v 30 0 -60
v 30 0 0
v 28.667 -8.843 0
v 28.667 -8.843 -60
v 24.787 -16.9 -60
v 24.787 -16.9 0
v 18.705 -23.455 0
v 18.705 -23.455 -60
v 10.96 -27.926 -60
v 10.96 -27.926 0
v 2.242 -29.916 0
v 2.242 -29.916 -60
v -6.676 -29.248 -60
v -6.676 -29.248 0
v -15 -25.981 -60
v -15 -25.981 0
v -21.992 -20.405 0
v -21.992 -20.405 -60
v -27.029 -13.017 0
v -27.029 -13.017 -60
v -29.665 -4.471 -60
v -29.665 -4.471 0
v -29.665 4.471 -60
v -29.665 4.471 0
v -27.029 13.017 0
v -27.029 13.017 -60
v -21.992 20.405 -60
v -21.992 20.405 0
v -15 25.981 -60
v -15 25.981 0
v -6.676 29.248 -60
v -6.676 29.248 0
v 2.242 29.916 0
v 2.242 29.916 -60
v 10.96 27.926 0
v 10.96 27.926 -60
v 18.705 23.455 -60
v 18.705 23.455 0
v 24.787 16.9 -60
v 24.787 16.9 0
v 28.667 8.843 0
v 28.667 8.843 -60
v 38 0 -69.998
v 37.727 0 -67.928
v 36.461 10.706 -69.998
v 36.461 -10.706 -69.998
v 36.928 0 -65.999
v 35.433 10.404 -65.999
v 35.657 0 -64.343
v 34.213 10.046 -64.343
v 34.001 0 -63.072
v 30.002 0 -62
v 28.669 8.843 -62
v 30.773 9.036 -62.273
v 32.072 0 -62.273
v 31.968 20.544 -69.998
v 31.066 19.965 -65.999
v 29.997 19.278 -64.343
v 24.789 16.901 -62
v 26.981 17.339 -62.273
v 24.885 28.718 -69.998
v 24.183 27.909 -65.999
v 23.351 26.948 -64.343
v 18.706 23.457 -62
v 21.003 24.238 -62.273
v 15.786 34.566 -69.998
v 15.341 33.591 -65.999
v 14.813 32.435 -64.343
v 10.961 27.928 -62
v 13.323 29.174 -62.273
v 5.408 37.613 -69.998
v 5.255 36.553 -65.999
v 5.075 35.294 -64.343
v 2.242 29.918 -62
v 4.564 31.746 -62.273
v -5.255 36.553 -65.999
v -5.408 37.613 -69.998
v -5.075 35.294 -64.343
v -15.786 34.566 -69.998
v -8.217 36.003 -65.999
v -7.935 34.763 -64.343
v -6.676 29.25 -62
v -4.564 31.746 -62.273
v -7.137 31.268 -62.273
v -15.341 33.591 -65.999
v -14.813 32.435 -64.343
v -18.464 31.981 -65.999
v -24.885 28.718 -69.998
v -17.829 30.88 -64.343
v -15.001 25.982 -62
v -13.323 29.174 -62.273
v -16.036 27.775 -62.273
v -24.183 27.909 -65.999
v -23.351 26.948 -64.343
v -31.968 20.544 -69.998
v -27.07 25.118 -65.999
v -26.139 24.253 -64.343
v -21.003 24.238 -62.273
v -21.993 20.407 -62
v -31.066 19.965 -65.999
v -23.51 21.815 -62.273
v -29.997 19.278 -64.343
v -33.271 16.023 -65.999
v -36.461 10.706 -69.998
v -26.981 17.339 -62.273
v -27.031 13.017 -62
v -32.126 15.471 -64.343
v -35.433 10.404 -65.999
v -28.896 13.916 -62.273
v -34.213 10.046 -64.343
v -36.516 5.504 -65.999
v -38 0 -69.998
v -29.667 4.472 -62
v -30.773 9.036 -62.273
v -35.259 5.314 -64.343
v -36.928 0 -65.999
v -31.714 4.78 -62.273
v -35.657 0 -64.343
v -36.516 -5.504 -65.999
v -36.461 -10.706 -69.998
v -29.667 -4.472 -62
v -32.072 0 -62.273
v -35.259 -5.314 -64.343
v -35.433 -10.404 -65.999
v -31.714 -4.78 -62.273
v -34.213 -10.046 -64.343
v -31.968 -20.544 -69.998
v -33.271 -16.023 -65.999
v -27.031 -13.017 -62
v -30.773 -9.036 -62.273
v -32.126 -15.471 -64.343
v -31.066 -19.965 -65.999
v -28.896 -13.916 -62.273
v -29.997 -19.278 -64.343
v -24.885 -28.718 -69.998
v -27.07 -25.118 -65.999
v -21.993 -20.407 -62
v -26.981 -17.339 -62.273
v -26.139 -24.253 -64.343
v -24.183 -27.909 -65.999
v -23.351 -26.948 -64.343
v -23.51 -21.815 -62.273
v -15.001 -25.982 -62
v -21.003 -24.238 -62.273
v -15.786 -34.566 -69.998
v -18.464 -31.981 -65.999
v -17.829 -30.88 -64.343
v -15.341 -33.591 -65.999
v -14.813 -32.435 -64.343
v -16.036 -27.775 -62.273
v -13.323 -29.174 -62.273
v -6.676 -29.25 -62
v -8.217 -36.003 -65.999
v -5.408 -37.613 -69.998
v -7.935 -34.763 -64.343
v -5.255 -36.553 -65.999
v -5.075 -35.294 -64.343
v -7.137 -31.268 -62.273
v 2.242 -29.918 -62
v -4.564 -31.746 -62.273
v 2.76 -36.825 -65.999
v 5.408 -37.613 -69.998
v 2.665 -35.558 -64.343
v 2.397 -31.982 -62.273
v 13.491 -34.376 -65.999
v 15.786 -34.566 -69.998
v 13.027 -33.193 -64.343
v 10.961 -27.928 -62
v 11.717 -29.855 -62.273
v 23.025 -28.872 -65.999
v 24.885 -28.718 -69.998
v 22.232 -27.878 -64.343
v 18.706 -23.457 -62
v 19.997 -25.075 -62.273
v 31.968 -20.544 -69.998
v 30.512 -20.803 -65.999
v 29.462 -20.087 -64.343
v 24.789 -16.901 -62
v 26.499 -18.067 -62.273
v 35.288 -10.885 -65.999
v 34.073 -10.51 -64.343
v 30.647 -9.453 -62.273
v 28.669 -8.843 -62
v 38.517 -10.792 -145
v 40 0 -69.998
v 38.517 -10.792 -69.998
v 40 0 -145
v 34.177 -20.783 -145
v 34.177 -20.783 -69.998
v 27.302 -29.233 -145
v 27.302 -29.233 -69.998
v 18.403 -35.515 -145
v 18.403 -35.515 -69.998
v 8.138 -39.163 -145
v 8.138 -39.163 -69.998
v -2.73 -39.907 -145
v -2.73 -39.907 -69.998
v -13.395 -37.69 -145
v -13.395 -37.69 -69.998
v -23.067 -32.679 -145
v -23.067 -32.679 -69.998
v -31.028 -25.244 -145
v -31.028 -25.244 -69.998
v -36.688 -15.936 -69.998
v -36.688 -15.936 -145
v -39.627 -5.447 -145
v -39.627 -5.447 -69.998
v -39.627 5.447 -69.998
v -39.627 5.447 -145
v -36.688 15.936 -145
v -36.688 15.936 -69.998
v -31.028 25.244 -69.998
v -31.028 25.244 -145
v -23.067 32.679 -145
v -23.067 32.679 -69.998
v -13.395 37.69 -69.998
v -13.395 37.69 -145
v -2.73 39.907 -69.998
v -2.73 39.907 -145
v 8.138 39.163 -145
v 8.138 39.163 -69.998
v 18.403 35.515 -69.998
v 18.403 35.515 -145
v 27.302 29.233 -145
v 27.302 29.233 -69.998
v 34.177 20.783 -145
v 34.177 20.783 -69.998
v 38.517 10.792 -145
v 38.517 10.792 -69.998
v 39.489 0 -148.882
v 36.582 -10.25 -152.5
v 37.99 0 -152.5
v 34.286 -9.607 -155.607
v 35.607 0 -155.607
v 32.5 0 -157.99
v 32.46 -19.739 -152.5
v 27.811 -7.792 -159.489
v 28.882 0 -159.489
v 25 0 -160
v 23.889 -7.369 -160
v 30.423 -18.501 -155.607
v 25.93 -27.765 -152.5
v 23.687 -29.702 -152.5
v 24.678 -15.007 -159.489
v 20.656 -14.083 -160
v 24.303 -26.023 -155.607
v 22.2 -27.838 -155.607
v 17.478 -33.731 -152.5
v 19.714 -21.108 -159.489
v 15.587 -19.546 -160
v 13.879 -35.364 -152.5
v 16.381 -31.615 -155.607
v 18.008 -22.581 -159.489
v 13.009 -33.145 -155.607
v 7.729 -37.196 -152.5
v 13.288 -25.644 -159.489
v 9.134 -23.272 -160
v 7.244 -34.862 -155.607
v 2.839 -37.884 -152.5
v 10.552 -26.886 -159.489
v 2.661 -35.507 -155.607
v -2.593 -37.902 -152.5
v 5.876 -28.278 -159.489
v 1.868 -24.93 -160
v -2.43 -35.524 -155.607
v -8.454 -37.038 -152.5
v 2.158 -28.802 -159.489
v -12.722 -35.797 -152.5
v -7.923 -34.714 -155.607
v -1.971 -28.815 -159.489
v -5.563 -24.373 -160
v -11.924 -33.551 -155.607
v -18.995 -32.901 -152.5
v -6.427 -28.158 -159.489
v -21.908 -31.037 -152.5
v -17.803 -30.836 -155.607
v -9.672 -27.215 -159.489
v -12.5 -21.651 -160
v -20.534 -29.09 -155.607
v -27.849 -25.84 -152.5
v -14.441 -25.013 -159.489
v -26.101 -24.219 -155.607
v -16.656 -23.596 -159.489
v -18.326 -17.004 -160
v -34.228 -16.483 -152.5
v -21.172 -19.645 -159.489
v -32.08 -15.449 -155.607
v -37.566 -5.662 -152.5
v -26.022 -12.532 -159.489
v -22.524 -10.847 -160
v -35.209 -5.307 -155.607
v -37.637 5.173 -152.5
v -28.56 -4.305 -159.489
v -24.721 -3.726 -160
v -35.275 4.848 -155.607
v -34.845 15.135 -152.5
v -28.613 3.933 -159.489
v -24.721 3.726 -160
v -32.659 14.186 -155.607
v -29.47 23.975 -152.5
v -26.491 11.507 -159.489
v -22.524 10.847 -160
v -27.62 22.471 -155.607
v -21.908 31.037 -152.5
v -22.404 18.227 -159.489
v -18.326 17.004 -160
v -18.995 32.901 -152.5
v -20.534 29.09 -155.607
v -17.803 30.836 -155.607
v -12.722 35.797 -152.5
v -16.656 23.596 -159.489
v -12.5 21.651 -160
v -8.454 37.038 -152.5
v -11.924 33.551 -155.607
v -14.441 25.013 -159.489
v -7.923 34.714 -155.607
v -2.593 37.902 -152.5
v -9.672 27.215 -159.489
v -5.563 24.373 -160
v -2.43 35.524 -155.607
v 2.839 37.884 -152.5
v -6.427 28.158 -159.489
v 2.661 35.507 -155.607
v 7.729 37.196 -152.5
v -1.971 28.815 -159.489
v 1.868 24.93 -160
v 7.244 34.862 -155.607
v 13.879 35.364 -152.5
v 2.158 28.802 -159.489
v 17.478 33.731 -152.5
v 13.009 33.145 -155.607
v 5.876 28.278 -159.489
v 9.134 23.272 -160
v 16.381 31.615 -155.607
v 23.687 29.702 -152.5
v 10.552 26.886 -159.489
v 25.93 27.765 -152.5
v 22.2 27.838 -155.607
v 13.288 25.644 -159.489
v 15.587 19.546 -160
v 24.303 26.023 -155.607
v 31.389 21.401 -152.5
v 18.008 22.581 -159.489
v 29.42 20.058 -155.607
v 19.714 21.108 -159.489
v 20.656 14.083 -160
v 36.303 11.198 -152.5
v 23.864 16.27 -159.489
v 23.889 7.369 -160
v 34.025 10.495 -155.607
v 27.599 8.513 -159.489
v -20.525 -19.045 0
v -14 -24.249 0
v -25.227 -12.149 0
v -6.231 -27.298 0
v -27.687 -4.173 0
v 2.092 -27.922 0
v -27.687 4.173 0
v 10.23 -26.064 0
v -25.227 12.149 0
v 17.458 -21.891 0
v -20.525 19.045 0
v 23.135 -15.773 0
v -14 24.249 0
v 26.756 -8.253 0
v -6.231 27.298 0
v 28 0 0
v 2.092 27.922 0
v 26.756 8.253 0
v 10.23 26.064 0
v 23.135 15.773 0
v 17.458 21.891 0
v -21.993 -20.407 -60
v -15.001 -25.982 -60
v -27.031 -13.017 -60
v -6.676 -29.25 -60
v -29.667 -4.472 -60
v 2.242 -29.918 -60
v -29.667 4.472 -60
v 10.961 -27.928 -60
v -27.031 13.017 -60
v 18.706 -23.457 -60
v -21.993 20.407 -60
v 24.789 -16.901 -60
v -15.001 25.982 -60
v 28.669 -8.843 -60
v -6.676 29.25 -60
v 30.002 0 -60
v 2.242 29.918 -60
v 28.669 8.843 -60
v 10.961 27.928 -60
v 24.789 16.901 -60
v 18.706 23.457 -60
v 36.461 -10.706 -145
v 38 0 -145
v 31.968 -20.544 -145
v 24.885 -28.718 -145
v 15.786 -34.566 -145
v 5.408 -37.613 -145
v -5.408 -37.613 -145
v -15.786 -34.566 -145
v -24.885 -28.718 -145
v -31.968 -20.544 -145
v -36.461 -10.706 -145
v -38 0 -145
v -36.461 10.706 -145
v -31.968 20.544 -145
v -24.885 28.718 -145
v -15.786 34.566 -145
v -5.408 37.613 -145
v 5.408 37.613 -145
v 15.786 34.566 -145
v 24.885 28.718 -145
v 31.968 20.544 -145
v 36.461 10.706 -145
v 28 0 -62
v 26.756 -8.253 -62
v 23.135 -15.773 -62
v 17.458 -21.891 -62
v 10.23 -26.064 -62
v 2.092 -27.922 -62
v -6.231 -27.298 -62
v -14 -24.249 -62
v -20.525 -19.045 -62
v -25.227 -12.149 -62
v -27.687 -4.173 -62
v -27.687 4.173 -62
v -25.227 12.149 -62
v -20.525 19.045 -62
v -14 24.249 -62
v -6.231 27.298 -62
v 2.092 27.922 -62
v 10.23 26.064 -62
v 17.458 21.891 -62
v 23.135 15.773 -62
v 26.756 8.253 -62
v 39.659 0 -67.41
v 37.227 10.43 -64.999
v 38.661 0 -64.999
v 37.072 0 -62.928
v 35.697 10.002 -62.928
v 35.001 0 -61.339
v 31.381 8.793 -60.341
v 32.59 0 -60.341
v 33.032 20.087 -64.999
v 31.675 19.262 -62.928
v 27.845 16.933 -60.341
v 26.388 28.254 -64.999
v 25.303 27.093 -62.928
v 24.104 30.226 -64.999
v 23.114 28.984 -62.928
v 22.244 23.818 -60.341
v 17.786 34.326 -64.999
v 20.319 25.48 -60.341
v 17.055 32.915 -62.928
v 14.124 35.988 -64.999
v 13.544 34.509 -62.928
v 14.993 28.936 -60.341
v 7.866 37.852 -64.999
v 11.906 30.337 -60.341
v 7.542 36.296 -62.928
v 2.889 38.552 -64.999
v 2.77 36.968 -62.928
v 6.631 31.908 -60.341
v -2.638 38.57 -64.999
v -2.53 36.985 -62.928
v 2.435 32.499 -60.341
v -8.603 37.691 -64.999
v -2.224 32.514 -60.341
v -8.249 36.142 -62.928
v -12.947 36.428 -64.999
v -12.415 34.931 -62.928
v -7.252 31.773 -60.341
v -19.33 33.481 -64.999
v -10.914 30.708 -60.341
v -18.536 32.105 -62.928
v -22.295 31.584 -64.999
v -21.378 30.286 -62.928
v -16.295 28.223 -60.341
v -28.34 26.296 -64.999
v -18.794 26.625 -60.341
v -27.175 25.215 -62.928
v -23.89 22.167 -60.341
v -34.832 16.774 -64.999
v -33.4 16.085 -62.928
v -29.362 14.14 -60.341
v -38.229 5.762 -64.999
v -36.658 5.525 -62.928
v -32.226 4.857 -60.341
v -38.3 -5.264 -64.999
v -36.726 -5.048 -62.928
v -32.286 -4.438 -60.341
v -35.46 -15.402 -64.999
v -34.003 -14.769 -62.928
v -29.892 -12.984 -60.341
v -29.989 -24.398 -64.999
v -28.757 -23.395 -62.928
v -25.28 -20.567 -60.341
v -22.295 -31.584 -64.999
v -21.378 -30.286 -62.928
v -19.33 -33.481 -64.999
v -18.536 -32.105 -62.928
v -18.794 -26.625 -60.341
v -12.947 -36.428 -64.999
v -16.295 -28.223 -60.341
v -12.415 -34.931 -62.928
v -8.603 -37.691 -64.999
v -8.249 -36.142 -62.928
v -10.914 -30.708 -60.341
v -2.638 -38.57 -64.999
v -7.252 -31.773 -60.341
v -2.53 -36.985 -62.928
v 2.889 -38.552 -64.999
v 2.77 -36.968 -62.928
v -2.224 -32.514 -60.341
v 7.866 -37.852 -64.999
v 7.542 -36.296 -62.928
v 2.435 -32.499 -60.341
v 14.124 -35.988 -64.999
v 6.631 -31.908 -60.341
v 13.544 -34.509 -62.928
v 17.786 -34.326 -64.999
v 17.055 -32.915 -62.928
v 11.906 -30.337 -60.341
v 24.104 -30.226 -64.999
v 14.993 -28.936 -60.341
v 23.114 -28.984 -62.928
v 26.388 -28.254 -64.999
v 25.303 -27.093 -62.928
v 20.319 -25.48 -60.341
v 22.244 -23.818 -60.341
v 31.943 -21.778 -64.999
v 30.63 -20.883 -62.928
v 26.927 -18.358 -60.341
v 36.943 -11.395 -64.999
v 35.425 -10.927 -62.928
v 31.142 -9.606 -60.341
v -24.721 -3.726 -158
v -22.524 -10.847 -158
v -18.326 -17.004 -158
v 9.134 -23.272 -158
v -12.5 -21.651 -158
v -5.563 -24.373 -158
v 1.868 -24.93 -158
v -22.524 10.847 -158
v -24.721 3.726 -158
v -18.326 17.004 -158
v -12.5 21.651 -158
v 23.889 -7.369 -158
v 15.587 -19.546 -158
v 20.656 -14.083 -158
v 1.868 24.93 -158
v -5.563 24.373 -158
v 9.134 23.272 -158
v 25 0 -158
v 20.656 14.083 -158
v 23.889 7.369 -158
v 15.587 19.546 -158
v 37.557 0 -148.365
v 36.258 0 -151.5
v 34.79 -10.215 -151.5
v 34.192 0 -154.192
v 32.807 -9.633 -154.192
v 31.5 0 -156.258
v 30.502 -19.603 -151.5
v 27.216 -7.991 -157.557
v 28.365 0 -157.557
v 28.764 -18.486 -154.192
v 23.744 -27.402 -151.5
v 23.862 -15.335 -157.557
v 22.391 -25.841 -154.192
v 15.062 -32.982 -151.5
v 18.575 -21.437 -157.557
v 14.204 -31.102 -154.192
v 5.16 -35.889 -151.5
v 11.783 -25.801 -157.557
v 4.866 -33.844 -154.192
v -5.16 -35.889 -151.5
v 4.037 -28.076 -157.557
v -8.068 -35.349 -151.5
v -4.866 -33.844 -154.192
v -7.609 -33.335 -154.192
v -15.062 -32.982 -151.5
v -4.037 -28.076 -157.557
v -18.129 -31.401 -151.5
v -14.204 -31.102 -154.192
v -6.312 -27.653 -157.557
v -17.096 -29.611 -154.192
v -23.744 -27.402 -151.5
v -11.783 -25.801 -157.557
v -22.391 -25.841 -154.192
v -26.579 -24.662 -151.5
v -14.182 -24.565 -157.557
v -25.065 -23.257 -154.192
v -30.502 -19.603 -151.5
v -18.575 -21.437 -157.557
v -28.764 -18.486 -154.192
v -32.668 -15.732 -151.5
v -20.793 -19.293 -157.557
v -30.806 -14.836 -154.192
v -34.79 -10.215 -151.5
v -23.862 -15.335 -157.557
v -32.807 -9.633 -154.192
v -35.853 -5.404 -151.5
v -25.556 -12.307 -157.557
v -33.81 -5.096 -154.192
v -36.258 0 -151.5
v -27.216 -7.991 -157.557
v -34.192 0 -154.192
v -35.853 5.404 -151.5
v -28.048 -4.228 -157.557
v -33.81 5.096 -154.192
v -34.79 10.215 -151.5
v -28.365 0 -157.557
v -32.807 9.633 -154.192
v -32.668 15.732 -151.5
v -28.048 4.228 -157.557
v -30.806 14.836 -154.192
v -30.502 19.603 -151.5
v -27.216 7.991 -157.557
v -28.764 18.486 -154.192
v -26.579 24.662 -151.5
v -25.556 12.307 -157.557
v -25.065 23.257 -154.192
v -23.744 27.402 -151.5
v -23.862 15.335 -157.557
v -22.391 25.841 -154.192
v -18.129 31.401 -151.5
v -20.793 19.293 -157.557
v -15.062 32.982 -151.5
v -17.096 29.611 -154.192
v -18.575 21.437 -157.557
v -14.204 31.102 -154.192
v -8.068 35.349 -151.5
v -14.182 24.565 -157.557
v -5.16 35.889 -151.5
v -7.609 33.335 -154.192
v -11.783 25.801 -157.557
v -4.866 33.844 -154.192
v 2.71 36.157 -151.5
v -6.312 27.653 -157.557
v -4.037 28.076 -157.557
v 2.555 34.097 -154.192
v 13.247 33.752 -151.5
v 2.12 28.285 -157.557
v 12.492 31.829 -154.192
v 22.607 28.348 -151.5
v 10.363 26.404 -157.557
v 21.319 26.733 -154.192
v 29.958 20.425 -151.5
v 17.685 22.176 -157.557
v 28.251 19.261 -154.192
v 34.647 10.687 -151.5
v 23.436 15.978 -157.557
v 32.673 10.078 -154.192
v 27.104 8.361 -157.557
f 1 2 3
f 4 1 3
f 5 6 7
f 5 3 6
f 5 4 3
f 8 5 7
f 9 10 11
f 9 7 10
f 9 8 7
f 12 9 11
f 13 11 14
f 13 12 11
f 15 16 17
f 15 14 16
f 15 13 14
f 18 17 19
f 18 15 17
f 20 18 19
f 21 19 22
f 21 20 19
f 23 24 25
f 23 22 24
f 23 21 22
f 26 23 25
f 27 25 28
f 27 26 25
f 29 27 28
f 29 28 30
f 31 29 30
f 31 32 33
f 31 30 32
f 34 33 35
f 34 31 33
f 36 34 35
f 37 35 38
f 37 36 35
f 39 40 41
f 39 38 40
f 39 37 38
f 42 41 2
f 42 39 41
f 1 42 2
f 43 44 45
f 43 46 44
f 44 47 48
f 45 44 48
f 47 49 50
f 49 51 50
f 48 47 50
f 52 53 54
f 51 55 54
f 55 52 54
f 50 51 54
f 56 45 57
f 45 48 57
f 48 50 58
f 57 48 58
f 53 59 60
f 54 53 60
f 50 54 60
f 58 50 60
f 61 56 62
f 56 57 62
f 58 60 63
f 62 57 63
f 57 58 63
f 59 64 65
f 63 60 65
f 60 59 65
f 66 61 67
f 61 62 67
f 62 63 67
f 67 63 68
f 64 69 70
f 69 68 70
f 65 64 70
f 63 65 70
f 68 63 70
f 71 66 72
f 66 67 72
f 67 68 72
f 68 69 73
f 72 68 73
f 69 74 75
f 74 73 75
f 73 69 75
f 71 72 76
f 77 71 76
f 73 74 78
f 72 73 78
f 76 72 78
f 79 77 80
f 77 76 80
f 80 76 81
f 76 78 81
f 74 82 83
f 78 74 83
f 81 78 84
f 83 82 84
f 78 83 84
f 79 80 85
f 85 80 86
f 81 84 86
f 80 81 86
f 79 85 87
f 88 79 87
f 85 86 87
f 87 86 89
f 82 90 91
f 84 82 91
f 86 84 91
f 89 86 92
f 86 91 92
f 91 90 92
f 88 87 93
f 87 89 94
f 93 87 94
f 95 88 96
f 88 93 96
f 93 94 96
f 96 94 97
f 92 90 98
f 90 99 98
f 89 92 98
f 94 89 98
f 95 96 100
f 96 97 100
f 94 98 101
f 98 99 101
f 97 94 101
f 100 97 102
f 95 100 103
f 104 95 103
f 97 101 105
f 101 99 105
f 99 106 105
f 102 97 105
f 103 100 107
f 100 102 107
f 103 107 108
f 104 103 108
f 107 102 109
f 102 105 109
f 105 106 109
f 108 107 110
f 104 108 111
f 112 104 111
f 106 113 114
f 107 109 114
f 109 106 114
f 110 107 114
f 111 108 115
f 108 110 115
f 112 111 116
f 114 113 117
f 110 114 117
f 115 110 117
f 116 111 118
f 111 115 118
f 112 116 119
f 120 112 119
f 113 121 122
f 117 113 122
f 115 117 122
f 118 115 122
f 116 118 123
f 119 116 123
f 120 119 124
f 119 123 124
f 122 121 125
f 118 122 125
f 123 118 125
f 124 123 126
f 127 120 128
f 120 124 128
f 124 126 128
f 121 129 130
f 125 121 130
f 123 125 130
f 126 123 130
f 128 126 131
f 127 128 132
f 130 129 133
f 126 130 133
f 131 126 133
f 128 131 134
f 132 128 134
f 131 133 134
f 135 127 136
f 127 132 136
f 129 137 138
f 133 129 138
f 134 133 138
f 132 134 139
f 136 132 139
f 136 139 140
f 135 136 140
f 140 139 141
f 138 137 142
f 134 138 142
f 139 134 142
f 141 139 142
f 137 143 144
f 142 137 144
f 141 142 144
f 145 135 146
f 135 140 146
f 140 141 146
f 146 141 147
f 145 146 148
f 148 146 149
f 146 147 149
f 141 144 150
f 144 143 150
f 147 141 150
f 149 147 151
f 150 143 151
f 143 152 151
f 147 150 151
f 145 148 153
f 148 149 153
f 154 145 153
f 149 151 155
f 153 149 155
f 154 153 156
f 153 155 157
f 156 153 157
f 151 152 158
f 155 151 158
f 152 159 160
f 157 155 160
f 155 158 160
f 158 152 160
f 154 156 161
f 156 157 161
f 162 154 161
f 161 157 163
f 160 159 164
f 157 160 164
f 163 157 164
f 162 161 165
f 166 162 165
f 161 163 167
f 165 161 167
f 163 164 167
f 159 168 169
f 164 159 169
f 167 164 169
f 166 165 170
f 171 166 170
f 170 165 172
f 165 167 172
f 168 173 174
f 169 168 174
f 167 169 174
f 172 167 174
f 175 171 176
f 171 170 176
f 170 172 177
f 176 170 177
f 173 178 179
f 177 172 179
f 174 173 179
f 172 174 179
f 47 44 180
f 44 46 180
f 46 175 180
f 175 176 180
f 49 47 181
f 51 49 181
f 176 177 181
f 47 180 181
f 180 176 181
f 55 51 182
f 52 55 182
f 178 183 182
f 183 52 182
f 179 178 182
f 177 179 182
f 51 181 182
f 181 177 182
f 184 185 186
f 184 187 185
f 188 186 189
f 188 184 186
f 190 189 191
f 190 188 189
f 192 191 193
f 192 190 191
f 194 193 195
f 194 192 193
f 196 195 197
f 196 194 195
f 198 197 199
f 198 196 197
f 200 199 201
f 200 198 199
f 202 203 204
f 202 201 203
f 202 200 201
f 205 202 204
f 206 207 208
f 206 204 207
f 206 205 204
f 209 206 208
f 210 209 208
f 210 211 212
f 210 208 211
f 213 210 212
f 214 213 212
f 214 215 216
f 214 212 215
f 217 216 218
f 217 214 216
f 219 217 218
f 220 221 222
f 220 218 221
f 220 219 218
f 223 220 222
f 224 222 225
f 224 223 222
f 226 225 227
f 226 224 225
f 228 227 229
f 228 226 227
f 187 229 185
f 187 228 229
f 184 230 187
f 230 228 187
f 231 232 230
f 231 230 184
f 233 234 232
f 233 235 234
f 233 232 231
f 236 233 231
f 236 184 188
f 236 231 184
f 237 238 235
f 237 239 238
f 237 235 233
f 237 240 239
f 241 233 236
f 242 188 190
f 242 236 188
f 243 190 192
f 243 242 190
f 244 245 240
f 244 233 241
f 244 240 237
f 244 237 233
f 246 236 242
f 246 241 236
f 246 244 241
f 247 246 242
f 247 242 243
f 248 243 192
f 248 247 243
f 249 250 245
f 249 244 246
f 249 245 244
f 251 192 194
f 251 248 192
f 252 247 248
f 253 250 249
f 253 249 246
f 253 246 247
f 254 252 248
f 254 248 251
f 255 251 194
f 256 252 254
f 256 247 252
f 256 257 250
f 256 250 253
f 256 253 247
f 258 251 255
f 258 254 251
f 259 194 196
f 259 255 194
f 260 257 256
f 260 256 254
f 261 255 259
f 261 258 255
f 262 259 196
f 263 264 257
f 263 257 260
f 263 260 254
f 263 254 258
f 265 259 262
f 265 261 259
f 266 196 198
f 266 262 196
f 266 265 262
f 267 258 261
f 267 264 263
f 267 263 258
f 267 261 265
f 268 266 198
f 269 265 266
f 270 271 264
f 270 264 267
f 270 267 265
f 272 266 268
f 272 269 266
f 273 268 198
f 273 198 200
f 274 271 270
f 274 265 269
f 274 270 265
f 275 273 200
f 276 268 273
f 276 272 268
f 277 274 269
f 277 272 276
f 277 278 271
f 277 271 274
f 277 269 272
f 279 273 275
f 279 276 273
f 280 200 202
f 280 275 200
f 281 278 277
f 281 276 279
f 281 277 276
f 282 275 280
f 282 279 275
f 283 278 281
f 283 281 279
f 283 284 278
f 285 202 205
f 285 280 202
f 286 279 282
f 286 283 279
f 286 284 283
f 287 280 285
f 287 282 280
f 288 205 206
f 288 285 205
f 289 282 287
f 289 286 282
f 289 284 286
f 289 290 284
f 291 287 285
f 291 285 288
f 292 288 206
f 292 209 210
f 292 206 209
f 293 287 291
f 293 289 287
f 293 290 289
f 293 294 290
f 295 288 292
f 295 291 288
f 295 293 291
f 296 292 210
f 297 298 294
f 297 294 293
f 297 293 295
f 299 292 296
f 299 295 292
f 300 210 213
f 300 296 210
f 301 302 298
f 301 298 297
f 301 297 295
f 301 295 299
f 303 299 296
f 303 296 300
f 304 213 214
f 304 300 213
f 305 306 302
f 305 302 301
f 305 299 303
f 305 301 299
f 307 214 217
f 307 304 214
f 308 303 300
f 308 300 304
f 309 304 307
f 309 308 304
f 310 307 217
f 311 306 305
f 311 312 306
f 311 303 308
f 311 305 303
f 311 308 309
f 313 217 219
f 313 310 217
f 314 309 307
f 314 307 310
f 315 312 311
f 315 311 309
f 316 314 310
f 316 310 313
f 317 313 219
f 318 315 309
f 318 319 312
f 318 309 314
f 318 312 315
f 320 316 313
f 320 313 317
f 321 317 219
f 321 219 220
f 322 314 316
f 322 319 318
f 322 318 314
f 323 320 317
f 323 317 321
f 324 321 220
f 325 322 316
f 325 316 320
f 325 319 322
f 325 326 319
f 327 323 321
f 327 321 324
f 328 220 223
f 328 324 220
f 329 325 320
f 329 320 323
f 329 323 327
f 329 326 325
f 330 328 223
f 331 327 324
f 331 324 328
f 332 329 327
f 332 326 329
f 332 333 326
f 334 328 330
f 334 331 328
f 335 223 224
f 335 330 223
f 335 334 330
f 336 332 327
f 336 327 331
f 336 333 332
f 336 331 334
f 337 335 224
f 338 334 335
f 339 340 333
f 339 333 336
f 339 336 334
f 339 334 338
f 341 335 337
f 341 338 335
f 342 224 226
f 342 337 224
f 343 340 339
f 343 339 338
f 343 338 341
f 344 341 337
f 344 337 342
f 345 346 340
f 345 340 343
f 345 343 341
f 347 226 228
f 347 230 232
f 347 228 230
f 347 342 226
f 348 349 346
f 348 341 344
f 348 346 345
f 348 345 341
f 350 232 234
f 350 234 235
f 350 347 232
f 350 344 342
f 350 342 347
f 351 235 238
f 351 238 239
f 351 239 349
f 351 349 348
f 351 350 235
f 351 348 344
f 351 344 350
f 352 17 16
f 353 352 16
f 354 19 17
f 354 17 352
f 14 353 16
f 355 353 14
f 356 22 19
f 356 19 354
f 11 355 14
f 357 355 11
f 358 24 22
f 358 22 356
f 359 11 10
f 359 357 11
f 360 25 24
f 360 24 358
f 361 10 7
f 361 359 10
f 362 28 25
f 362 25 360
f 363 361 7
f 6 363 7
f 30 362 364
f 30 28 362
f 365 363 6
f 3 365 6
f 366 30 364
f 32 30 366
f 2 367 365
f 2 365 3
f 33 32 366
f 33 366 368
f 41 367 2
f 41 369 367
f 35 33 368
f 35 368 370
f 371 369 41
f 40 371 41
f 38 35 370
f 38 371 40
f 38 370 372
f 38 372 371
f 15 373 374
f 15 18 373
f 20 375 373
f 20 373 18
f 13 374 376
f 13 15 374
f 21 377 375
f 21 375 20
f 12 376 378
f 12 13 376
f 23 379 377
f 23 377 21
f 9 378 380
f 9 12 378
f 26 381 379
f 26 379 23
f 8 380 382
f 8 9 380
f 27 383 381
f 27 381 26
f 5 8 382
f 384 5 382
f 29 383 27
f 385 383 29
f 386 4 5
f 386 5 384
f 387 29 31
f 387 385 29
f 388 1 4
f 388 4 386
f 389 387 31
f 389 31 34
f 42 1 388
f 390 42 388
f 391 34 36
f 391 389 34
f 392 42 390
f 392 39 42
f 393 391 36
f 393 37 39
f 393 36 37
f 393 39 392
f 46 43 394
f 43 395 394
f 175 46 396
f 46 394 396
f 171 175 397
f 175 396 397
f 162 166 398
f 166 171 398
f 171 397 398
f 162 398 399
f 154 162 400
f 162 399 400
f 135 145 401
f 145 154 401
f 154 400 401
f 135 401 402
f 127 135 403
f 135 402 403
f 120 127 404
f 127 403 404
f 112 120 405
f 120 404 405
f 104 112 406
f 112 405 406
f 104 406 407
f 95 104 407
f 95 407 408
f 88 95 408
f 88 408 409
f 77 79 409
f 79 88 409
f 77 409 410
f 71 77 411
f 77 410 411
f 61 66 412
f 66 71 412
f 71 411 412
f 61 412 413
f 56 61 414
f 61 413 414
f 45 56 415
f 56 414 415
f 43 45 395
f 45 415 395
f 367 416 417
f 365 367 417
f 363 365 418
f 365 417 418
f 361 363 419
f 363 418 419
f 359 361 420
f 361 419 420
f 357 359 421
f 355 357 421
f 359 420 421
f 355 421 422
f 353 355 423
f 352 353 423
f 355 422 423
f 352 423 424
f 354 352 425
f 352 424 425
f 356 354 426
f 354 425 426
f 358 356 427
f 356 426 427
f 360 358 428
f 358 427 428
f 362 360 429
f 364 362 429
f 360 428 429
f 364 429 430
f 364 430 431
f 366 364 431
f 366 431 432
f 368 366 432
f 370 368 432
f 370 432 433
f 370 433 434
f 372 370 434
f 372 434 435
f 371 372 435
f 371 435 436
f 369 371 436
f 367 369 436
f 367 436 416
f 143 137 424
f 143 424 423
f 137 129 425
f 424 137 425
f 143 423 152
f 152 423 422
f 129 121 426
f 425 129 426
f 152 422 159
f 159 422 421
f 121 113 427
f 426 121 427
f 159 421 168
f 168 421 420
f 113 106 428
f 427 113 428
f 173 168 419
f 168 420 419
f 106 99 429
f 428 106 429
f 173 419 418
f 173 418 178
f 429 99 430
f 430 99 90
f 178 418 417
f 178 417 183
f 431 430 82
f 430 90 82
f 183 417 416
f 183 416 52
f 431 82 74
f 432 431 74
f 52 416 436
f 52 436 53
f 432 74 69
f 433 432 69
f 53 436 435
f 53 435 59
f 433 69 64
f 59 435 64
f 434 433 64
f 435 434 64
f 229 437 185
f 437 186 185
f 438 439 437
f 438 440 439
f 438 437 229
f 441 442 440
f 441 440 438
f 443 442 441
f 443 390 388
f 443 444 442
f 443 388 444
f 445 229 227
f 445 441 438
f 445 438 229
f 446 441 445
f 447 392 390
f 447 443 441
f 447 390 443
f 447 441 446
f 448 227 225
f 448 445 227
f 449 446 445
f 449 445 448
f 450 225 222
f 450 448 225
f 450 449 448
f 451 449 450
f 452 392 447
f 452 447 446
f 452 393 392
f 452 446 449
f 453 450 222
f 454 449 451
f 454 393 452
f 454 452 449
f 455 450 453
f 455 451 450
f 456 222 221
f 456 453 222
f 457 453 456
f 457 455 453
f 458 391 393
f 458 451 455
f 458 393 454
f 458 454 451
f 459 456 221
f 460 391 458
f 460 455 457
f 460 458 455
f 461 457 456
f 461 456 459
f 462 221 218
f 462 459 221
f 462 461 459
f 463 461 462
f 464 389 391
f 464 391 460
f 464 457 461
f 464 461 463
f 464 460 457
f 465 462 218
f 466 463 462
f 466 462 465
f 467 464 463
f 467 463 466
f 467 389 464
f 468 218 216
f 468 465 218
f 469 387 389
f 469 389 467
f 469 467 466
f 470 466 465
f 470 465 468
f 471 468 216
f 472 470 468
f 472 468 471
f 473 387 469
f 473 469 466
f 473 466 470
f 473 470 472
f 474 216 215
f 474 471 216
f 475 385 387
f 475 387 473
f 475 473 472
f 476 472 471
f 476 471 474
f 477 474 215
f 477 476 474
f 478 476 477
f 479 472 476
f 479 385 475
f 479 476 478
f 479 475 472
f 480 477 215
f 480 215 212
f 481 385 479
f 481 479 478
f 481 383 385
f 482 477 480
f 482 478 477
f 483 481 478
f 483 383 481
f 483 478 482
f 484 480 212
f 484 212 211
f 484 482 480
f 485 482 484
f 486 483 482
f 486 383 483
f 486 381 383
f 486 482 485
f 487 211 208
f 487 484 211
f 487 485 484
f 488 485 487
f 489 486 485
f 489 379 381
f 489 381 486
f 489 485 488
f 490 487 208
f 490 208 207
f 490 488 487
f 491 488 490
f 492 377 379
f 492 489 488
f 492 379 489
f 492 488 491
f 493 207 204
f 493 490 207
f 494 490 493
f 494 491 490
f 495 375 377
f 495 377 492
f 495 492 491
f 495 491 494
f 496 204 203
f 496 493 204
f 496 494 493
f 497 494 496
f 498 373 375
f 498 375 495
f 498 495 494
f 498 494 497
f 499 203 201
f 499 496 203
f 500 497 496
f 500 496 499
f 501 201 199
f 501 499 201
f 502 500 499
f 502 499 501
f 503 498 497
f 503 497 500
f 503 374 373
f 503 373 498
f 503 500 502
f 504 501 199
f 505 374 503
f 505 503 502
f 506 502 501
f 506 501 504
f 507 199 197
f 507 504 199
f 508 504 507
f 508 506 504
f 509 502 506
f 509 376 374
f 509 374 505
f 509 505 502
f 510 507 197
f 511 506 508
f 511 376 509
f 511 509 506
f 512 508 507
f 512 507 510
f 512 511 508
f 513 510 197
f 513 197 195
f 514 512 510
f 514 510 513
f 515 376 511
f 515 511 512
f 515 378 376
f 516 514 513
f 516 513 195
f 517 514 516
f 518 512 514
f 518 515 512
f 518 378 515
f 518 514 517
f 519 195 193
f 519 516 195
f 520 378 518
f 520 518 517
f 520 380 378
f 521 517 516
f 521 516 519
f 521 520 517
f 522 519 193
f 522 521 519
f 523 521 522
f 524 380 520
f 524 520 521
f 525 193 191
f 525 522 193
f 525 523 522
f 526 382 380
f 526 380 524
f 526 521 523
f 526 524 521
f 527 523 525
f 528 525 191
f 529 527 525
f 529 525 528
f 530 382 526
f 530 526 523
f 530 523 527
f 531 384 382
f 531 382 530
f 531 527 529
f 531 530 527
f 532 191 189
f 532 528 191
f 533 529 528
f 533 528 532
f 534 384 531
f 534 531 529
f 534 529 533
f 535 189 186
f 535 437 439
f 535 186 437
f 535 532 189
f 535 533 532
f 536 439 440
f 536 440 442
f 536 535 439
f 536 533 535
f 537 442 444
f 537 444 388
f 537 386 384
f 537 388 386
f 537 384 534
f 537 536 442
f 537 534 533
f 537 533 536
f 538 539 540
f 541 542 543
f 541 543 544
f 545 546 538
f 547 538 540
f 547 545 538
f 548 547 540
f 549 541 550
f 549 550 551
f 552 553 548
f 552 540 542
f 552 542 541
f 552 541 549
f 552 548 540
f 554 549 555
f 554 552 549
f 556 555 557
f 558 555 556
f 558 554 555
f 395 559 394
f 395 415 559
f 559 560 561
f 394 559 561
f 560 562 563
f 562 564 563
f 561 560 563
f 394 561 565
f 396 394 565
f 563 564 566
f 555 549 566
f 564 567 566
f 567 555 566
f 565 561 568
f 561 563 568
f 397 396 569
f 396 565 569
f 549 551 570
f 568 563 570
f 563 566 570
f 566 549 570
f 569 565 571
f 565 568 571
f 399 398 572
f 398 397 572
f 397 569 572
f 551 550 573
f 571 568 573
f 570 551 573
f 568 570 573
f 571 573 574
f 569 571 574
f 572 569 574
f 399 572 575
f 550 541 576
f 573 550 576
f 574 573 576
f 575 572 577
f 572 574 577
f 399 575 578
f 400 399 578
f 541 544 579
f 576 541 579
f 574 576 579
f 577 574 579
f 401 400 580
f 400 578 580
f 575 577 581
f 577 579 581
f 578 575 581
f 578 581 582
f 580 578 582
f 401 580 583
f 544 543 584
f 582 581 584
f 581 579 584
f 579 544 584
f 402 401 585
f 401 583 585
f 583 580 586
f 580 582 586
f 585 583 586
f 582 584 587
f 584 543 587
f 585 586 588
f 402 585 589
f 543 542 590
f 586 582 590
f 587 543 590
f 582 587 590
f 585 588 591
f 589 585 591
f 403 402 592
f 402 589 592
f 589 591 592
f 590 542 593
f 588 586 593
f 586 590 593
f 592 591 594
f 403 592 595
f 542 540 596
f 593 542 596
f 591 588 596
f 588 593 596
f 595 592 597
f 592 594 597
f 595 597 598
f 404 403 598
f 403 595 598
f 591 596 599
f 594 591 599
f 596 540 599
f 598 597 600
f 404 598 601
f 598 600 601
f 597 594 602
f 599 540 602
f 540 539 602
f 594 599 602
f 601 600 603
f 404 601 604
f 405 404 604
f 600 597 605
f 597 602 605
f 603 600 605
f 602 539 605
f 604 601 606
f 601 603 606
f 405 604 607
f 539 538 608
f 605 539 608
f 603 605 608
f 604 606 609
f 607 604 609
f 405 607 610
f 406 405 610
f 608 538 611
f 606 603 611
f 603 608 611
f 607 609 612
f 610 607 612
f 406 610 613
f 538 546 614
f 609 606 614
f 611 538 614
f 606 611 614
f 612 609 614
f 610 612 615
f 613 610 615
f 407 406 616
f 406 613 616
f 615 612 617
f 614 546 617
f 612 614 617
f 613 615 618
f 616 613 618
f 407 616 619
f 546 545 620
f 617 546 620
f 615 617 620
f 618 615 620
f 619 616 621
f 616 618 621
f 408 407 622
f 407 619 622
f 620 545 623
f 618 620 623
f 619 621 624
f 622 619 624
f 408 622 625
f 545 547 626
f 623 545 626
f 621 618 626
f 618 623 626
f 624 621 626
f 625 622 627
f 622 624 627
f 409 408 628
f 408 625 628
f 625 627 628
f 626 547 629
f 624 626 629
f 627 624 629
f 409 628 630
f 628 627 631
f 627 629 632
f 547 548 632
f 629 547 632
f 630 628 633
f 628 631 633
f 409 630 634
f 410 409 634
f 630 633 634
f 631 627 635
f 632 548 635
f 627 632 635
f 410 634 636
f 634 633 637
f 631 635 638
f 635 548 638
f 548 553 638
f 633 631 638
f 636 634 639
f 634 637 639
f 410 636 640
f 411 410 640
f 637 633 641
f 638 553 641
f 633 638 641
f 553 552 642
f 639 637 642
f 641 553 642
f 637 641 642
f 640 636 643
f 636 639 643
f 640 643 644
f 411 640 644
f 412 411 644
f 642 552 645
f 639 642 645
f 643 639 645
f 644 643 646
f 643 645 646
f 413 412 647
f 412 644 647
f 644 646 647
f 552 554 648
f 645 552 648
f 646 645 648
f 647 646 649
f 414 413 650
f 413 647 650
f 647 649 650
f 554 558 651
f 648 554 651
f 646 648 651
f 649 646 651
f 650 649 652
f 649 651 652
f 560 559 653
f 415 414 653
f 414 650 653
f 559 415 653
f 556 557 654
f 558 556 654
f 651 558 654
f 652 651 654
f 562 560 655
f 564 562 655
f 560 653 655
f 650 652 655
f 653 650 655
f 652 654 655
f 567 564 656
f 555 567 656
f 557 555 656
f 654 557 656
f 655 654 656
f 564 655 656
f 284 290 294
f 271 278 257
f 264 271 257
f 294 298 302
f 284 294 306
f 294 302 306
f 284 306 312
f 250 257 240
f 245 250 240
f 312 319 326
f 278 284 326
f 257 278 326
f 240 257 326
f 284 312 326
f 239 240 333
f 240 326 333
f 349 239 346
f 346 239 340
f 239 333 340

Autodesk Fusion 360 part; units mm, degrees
sketch "Sketch1" plane through (0, 0, 0) normal (0, 1, 0) x (1, 0, 0)
  line L0 (0, 0) -> (30, 0)
  line L1 (30, 0) -> (30, 60)
  line L2 (30, 60) -> (40, 60)
  line L3 (40, 60) -> (40, 160)
  line L4 (40, 160) -> (0, 160)
  line L5 (0, 160) -> (0, 0)
  dimension "d8" = 100
  dimension "d9" = 160
  dimension "d10" = 30
revolve "Revolve1" add sketch "Sketch1" angle 360 about axis through (0, 0, -160) along (0, 0, 1)
fillet "Fillet1" radius 10 1 edges at (-37.2931, -14.4646, -60)
fillet "Fillet2" radius 15 1 edges at (-37.2931, -14.4646, -160)
shell "Shell1" thickness 2 removed faces 1 at (14.141, -6.0737, 0)
equation "overalheight = 160 mm"
equation "neckheight = 100 mm"
equation "fillet1 = 15 mm"
equation "fillet2 = 10 mm"
equation "fillet3 = 5 mm"
equation "diameter = 30 mm"
equation "wallthickness = 2 mm"
equation "d8 = neckheight"
equation "d9 = overalheight"
equation "d10 = diameter"
equation "d12 = fillet2"
equation "d13 = fillet1"
equation "d14 = wallthickness"
